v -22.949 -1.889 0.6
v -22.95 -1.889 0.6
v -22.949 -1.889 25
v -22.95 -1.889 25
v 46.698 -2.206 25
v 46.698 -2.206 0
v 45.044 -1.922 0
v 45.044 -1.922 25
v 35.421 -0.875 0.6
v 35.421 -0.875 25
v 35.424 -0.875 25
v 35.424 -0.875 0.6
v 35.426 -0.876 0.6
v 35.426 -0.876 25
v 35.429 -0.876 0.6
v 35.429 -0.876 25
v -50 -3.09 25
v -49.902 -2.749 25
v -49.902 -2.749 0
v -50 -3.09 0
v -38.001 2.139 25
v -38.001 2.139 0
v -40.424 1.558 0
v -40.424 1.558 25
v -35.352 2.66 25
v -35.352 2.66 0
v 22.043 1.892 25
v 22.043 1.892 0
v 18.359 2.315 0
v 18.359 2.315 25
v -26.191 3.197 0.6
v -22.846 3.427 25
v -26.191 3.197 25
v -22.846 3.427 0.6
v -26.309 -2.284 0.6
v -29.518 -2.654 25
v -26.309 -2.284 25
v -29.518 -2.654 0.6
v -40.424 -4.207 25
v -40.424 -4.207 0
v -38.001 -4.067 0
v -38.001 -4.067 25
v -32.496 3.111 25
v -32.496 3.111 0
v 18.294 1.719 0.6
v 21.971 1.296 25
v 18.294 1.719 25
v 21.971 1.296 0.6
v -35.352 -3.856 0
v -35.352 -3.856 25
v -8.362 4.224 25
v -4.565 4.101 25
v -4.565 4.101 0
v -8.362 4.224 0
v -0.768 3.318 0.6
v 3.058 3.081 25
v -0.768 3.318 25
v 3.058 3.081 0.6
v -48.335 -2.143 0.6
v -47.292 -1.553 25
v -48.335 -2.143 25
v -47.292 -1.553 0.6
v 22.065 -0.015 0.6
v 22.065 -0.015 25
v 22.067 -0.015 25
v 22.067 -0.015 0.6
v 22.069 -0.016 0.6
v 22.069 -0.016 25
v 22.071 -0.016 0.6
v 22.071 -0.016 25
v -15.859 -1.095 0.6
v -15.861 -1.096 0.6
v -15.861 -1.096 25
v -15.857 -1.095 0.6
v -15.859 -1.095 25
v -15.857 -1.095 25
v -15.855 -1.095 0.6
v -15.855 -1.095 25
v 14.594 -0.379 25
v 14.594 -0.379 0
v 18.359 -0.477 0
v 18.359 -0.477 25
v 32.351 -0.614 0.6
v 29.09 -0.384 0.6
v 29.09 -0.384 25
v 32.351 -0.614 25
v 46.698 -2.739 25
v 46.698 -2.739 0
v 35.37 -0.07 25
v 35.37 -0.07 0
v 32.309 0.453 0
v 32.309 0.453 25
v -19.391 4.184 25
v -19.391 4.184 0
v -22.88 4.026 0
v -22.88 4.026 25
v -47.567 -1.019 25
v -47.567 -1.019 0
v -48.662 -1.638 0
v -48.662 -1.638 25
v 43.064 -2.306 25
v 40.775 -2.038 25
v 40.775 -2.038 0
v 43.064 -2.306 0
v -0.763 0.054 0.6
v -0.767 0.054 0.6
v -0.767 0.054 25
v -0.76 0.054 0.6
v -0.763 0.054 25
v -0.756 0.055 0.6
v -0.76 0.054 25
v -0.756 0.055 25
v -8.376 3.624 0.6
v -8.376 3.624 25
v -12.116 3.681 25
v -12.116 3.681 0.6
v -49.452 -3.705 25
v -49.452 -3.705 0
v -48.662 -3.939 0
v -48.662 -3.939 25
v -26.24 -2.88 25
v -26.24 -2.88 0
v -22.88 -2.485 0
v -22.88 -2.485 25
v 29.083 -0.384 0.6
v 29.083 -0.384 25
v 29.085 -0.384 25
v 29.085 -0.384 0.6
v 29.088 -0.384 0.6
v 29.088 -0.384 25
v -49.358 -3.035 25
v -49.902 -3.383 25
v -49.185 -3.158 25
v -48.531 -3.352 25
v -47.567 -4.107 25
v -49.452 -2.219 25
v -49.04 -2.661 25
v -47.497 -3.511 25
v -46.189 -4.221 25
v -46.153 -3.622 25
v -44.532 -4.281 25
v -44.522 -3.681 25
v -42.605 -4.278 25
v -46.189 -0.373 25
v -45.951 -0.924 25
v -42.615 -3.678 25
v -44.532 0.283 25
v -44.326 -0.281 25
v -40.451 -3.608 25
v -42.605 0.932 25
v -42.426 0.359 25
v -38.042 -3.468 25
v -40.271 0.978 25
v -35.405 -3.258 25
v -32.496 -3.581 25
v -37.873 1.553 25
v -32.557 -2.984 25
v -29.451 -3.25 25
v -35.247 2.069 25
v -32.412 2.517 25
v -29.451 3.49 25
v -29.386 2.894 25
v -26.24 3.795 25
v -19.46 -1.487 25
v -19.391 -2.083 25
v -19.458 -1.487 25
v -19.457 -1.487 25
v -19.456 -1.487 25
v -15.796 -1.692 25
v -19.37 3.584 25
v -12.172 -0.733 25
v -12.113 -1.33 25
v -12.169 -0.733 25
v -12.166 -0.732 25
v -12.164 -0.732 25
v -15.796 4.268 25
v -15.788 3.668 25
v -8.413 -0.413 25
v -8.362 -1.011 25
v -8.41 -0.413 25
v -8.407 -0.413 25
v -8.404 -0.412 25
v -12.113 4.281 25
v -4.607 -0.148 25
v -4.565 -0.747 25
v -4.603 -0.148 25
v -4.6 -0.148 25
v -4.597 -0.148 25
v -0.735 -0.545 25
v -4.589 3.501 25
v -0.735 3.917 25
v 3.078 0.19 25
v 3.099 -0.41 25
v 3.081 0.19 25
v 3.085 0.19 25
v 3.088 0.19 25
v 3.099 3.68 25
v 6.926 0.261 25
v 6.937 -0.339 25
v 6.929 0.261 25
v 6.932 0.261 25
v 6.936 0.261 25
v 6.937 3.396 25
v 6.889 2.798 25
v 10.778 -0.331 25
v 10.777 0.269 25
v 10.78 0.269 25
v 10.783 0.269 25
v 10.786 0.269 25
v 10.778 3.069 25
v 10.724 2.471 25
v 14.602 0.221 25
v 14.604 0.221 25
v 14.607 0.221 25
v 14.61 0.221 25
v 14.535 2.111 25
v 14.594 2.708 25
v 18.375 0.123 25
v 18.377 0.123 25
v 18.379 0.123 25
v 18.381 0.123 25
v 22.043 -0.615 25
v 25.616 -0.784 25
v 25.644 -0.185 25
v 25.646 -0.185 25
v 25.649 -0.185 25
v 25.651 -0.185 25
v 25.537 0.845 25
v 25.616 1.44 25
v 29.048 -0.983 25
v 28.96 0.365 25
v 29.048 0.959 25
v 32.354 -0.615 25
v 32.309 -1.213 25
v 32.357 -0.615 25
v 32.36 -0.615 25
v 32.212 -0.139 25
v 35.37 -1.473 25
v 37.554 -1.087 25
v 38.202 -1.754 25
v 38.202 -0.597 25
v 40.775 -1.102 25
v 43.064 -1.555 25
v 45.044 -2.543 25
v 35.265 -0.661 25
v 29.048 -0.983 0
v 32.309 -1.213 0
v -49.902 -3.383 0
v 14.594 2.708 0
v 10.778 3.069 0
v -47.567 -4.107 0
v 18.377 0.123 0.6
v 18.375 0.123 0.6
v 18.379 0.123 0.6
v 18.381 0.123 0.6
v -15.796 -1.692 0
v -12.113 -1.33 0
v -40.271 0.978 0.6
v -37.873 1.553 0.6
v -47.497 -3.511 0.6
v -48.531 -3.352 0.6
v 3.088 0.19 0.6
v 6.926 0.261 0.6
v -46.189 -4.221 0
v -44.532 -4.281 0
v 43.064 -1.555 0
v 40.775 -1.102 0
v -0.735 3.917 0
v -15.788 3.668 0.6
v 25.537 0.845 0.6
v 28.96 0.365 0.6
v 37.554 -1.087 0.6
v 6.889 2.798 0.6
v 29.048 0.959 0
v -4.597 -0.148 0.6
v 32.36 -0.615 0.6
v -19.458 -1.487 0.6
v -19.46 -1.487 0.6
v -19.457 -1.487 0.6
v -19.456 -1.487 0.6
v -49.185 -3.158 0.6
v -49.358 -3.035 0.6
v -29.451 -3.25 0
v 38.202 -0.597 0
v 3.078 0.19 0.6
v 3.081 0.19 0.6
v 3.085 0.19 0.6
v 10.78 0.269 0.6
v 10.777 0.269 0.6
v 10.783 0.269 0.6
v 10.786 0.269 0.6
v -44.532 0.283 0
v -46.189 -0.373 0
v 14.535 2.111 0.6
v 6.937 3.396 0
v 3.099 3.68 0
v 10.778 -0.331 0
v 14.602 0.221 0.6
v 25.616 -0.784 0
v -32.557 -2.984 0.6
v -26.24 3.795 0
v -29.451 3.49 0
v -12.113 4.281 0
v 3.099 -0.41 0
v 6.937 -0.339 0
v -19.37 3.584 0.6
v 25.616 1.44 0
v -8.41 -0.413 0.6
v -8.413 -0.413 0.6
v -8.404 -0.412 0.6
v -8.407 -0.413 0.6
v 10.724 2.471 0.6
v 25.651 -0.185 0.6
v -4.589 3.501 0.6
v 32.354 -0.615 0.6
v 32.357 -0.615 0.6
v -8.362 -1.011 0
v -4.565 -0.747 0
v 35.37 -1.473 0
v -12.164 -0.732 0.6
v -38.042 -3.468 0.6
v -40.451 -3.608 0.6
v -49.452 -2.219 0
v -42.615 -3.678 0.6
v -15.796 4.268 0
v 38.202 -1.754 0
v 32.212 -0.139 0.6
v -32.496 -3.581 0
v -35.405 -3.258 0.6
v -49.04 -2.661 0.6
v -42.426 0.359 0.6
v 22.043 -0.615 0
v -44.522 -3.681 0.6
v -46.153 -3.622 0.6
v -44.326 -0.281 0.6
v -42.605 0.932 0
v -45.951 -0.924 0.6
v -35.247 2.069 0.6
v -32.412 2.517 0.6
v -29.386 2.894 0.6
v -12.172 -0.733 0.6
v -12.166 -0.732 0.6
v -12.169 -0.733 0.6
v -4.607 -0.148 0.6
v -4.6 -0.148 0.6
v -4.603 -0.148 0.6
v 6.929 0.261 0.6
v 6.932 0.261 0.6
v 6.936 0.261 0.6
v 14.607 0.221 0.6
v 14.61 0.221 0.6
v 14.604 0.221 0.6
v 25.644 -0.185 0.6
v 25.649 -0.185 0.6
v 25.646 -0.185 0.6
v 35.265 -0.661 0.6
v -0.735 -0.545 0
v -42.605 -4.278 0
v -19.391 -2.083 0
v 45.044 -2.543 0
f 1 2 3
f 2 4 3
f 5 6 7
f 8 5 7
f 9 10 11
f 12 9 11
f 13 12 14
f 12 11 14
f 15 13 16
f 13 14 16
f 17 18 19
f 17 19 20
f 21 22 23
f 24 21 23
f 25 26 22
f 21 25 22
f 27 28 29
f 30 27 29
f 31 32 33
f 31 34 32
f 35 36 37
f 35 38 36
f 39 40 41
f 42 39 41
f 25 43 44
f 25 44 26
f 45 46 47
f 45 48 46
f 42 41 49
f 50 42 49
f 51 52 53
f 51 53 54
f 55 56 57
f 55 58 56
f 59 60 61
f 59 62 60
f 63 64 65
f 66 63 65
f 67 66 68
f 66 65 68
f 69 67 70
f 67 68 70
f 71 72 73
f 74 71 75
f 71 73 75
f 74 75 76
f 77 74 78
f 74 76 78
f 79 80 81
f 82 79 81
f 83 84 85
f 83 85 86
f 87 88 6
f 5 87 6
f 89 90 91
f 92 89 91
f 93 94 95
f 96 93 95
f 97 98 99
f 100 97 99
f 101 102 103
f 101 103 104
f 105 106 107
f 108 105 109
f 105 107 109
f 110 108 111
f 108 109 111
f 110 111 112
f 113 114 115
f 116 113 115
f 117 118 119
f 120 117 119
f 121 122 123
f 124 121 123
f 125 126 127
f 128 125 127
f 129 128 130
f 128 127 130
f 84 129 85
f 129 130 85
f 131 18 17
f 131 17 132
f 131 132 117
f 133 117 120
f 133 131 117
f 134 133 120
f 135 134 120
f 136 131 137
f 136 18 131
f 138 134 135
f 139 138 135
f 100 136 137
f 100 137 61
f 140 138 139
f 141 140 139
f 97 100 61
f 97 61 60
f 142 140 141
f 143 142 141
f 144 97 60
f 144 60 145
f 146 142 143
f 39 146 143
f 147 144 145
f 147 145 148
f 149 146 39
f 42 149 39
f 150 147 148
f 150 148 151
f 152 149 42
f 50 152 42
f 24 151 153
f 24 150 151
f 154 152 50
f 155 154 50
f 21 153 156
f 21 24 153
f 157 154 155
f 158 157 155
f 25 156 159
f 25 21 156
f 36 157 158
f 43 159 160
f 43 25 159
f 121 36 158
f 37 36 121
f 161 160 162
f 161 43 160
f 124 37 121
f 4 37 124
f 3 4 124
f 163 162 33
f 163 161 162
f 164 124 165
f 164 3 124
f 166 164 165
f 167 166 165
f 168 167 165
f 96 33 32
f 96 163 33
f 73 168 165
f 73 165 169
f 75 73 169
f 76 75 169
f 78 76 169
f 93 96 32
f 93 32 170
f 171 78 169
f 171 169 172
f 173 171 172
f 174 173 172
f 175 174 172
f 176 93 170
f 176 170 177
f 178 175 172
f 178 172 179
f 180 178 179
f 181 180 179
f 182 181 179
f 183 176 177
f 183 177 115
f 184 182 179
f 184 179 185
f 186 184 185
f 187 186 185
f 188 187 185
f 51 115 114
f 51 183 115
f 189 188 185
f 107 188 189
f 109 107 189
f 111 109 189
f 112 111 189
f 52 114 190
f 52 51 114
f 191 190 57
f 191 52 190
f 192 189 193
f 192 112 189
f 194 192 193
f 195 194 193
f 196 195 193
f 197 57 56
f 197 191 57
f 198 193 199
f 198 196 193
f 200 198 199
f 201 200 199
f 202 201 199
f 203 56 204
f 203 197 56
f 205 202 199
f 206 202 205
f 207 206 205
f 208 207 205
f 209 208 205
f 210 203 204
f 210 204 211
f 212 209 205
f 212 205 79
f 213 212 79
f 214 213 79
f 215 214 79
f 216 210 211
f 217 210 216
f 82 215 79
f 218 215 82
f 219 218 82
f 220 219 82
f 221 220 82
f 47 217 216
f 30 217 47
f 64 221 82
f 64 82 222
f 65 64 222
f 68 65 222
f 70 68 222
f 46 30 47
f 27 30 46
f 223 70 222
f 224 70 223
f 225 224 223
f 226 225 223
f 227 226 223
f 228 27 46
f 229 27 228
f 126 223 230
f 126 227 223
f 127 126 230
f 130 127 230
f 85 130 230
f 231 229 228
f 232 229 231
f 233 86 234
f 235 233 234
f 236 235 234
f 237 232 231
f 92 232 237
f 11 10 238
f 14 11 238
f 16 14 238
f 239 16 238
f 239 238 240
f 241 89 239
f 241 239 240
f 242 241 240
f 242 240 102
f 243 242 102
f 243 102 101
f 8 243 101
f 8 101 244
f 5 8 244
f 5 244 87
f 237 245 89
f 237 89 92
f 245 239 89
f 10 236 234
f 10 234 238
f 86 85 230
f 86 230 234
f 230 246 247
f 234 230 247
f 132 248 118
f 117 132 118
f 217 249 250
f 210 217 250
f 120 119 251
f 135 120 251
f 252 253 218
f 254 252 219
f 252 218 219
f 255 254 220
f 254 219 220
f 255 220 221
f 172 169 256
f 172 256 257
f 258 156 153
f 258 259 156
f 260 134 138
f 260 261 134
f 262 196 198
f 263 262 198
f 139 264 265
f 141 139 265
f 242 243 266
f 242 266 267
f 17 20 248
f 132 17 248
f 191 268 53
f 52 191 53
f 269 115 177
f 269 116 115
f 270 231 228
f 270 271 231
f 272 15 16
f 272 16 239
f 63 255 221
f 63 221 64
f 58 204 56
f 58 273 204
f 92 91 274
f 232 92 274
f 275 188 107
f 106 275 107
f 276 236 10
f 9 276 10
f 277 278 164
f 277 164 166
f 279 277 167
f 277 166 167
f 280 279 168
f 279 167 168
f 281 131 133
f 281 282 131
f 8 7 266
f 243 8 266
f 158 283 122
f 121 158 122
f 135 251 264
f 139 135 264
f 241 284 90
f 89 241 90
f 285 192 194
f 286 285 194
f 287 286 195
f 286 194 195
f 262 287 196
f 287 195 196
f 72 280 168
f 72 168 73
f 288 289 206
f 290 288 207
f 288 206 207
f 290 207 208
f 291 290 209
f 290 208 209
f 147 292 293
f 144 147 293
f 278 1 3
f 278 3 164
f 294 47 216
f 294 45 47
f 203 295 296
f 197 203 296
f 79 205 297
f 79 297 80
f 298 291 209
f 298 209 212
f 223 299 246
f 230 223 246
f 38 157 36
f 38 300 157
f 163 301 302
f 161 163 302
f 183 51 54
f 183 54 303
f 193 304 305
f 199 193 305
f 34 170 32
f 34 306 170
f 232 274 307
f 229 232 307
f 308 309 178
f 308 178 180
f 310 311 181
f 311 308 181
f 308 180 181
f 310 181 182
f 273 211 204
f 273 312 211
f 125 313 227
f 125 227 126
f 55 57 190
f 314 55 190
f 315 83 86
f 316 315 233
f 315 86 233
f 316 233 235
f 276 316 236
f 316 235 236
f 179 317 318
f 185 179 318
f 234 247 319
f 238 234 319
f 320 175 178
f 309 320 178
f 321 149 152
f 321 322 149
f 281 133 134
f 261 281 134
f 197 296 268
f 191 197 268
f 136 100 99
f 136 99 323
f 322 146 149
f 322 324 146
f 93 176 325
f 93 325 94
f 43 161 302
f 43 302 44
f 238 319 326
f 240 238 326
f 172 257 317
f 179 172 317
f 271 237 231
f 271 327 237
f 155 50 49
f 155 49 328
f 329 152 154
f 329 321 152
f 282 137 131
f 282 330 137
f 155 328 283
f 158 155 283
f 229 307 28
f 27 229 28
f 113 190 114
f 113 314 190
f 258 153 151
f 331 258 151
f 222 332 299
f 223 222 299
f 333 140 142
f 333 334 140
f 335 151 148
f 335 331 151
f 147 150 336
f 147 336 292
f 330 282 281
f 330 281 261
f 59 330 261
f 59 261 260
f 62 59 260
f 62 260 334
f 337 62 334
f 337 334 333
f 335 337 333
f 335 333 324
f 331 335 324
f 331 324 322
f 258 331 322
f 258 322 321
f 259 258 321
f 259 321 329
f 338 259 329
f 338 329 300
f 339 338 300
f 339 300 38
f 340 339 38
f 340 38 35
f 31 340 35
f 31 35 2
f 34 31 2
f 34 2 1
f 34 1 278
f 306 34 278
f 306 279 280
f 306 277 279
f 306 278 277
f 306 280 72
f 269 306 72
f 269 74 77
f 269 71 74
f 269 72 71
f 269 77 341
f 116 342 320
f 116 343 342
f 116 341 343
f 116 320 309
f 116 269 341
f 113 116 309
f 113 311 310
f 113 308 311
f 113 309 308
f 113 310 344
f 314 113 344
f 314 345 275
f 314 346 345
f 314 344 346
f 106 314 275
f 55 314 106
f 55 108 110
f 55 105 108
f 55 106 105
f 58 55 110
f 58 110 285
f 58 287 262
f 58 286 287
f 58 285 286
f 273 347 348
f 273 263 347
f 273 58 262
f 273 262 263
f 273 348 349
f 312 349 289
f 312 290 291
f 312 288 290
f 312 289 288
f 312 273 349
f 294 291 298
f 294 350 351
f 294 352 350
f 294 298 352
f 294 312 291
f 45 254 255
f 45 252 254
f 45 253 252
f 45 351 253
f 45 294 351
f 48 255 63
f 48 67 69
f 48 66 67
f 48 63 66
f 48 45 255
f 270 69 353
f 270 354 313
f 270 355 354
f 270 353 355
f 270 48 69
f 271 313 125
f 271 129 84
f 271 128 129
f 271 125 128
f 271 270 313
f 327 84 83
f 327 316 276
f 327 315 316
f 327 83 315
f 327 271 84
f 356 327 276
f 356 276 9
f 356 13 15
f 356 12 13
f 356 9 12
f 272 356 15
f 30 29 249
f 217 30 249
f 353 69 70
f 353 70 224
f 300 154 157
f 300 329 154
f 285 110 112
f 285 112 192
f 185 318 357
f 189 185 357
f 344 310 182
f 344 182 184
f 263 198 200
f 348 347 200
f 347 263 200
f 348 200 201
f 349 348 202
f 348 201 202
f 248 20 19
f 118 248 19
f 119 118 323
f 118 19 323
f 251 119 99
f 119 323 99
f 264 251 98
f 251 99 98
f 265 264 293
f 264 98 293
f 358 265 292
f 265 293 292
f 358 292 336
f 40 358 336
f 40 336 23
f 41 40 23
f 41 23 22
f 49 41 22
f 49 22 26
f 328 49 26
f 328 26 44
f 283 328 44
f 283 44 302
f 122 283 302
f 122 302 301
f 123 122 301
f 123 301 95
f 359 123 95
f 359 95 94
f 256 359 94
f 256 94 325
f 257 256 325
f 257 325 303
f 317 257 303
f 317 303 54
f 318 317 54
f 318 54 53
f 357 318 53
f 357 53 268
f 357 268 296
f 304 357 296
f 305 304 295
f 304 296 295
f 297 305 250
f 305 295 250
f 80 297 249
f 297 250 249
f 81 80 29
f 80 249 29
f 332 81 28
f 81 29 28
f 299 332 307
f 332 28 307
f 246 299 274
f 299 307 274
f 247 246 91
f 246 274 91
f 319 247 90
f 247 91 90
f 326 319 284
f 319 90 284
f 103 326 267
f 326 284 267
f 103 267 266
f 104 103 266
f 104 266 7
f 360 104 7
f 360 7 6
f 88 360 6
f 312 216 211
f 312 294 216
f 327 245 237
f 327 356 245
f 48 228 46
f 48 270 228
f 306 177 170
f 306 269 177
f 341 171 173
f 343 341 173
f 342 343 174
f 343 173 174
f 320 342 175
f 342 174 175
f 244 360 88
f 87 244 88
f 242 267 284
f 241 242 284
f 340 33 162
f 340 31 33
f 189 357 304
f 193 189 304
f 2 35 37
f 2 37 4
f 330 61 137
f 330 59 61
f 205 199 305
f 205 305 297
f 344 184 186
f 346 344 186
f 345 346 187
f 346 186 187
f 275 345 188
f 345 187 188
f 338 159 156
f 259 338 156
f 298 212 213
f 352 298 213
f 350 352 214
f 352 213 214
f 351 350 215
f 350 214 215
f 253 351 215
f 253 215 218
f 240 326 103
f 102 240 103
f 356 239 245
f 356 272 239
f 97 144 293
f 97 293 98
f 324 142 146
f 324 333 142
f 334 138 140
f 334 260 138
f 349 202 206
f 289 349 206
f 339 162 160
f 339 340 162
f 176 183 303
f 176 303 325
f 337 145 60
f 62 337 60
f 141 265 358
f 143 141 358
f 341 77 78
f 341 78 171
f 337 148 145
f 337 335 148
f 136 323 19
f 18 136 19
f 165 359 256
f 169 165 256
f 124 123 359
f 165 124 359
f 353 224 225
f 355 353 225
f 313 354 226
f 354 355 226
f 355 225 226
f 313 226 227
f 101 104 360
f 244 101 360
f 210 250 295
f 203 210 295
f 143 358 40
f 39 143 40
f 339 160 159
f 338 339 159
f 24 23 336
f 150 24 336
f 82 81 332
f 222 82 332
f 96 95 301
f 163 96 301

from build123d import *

# Parameters (mm, degrees)
F1_DEPTH = 25
F2_T     = -0.6


# Not quite as in the source:
# - a feature names something its author has since deleted; it is built from what else it names


with BuildPart() as f1:
    # F0 (on Top) → F1 (new body)
    with BuildSketch(Plane.XY):
        Polygon((46.698, -2.739), (46.698, -2.206), (45.044, -1.922), (43.064, -1.555), (40.775, -1.102), (38.202, -0.597), (35.37, -0.07), (35.37, -1.473), (38.202, -1.754), (40.775, -2.038), (43.064, -2.306), (45.044, -2.543), align=None)
        Polygon((35.37, -1.473), (35.37, -0.07), (32.309, 0.453), (29.048, 0.959), (25.616, 1.44), (22.043, 1.892), (18.359, 2.315), (14.594, 2.708), (10.778, 3.069), (6.937, 3.396), (3.099, 3.68), (-0.735, 3.917), (-4.565, 4.101), (-8.362, 4.224), (-12.113, 4.281), (-15.796, 4.268), (-19.391, 4.184), (-22.88, 4.026), (-26.24, 3.795), (-29.451, 3.49), (-32.496, 3.111), (-35.352, 2.66), (-38.001, 2.139), (-40.424, 1.558), (-42.605, 0.932), (-44.532, 0.283), (-46.189, -0.373), (-47.567, -1.019), (-48.662, -1.638), (-49.452, -2.219), (-49.902, -2.749), (-50, -3.09), (-49.902, -3.383), (-49.452, -3.705), (-48.662, -3.939), (-47.567, -4.107), (-46.189, -4.221), (-44.532, -4.281), (-42.605, -4.278), (-40.424, -4.207), (-38.001, -4.067), (-35.352, -3.856), (-32.496, -3.581), (-29.451, -3.25), (-26.24, -2.88), (-22.88, -2.485), (-19.391, -2.083), (-15.796, -1.692), (-12.113, -1.33), (-8.362, -1.011), (-4.565, -0.747), (-0.735, -0.545), (3.099, -0.41), (6.937, -0.339), (10.778, -0.331), (14.594, -0.379), (18.359, -0.477), (22.043, -0.615), (25.616, -0.784), (29.048, -0.983), (32.309, -1.213), align=None)
    extrude(amount=F1_DEPTH)

    # F2
    f2_openings = [f1.faces().sort_by_distance(p)[0] for p in [
        (-12.597329, 0.423659, 25),
    ]]
    offset(amount=F2_T, openings=f2_openings)


solid = f1.part
